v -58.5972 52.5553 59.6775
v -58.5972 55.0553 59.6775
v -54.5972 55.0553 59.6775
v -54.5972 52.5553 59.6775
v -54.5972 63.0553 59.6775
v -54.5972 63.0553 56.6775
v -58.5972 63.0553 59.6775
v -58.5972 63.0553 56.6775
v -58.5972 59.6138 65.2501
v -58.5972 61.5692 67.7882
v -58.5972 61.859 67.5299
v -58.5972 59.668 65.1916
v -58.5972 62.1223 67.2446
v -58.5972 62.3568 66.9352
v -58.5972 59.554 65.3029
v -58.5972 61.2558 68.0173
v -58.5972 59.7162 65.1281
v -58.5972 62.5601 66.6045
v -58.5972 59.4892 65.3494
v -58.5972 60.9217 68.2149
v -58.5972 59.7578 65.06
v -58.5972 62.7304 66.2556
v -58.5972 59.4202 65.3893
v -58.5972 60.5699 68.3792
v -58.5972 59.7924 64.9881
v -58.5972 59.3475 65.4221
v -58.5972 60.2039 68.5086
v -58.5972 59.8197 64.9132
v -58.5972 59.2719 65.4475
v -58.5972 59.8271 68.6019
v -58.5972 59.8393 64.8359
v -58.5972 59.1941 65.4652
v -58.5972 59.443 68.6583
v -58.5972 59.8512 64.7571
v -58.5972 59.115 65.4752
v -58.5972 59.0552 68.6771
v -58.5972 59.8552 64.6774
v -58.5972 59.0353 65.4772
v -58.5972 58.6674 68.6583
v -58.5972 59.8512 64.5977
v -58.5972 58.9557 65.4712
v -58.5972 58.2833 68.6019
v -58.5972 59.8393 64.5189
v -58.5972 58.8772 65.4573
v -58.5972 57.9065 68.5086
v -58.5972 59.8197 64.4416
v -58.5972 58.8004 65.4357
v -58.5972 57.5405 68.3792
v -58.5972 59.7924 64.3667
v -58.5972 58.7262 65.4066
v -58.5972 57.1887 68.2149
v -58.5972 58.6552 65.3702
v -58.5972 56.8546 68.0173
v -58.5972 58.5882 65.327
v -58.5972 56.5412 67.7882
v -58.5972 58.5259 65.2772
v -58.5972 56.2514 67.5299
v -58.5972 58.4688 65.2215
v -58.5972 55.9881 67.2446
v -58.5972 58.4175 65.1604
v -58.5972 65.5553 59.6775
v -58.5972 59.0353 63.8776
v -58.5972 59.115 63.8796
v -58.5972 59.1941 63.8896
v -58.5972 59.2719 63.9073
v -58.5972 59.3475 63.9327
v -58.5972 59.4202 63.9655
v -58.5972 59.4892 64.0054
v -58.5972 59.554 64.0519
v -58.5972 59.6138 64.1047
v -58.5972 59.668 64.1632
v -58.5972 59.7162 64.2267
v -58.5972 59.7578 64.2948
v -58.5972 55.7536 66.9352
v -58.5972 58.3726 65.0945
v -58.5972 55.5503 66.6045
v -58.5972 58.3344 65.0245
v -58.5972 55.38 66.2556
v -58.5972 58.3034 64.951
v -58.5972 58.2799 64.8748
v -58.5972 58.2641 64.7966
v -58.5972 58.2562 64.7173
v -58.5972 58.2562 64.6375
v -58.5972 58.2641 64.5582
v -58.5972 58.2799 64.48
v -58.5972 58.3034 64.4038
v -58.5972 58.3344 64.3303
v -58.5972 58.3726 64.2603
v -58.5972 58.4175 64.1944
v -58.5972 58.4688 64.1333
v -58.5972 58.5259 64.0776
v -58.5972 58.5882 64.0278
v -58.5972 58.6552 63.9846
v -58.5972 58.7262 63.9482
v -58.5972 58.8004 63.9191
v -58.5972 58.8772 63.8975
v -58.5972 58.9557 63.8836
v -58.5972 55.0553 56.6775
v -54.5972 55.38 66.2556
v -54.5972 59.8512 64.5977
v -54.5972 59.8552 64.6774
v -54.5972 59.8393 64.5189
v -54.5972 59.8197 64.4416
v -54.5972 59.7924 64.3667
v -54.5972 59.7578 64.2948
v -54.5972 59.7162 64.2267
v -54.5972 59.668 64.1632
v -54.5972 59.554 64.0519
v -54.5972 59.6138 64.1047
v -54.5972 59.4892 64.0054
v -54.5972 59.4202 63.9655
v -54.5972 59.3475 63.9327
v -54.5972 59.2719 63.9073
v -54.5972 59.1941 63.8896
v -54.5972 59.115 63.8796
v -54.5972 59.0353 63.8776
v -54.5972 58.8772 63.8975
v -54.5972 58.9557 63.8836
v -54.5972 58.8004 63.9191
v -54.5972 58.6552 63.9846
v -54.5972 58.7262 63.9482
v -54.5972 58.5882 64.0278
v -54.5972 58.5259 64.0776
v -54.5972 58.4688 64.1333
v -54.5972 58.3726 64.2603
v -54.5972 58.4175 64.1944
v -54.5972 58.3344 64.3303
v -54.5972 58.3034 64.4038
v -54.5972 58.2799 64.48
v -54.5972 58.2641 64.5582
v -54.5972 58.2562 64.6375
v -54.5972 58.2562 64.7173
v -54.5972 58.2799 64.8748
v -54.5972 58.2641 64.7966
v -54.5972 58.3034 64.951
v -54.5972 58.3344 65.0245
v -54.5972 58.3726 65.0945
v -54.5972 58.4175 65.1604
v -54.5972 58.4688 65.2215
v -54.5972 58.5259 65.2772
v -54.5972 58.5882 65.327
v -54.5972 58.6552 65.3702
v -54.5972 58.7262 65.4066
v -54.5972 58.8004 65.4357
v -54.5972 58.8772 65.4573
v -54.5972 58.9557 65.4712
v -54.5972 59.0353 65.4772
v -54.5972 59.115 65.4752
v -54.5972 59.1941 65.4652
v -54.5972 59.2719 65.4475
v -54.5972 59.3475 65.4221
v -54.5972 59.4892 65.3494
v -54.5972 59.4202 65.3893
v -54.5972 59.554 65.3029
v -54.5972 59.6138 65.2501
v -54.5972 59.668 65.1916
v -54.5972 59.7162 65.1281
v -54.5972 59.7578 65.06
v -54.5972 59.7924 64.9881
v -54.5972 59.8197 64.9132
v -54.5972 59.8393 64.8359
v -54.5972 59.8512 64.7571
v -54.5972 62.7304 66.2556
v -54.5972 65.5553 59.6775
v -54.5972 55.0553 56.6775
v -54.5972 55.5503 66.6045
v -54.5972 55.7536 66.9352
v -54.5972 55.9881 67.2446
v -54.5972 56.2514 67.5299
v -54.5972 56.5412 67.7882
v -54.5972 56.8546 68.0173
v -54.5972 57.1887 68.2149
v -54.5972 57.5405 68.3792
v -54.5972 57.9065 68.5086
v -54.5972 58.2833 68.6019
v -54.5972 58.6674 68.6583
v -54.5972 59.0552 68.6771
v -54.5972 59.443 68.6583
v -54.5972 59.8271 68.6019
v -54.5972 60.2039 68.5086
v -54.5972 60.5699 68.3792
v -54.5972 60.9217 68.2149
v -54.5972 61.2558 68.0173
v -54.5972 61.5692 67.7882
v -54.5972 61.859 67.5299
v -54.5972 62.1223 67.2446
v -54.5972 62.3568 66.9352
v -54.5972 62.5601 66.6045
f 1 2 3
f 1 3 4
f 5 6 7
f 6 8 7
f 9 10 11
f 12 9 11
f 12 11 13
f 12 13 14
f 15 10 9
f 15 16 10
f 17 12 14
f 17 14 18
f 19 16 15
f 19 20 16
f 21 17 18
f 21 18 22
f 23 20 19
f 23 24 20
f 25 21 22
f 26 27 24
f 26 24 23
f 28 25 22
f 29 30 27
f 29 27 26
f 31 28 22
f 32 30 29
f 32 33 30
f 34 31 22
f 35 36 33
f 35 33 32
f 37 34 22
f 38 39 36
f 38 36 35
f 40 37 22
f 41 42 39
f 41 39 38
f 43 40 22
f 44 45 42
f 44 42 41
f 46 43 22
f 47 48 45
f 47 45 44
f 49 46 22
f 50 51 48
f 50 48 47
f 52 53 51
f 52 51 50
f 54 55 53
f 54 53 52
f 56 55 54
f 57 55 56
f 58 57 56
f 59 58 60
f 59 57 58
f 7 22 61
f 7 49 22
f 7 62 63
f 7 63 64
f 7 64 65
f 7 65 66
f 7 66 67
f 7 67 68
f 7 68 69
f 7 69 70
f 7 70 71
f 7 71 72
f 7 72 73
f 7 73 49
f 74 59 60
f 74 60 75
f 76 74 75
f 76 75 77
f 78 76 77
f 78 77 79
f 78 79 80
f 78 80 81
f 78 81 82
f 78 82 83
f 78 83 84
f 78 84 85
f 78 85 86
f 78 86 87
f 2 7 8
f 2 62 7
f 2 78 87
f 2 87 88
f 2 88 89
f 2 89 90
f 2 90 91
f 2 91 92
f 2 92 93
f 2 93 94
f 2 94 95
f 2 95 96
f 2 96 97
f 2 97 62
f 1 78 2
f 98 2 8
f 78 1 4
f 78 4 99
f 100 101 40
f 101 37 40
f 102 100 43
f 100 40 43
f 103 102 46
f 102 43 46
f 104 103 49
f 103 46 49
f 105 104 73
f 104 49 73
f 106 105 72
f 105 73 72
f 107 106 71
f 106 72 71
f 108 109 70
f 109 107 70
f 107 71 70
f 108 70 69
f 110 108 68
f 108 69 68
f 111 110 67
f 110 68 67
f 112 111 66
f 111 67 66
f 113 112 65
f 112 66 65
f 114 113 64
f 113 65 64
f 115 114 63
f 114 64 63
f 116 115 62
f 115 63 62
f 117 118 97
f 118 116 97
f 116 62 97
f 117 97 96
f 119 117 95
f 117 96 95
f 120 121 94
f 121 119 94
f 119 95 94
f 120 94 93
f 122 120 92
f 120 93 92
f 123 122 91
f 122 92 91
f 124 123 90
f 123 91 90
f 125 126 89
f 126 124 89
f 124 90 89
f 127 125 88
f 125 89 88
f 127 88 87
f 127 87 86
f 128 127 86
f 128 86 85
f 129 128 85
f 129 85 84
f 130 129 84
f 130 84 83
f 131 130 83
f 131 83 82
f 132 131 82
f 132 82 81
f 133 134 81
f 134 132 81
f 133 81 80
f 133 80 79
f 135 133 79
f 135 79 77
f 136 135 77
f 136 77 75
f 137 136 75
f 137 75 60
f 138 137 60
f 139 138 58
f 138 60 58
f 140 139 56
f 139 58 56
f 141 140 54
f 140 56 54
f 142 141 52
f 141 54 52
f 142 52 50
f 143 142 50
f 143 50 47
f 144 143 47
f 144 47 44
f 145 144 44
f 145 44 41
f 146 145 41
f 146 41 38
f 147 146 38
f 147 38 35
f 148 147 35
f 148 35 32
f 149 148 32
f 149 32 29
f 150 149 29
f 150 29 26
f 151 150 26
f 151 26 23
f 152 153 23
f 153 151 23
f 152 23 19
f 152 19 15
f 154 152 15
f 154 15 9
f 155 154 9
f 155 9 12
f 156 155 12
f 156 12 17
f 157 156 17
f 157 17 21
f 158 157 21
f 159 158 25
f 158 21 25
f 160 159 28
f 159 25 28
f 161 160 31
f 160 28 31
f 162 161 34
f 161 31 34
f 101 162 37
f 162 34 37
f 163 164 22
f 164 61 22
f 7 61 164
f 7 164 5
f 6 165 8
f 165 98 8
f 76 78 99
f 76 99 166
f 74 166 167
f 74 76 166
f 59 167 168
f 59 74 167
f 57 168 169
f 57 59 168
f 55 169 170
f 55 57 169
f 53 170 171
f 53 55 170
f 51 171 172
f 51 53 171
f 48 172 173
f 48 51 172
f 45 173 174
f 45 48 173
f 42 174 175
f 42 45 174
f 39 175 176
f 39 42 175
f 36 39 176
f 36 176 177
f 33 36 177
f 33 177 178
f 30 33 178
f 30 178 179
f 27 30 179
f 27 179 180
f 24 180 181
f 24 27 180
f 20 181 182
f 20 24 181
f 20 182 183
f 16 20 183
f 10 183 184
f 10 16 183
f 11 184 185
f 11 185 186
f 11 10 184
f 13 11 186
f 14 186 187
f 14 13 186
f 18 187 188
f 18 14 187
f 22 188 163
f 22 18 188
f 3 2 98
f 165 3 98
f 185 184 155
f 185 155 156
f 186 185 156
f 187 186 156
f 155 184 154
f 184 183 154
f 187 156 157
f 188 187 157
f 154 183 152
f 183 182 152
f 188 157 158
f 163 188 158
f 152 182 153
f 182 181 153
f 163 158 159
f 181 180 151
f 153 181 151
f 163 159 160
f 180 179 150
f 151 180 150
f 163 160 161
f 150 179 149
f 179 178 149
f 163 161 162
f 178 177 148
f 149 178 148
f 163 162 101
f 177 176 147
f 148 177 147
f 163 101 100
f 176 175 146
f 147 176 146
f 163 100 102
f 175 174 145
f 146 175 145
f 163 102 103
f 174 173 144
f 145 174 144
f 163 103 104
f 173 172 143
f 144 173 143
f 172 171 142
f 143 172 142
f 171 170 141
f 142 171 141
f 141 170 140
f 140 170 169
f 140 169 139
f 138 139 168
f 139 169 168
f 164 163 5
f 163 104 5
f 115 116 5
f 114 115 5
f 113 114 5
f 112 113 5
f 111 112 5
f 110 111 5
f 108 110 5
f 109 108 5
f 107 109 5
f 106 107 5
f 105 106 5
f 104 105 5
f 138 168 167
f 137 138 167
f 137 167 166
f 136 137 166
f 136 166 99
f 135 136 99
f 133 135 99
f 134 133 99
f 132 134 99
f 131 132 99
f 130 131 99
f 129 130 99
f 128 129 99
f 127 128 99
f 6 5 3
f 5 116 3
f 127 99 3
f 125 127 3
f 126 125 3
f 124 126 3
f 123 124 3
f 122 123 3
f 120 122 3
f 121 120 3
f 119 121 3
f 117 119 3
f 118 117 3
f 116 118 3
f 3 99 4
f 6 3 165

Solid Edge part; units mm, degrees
sketch "Sketch1" plane through (-58.5972, 0, 0) normal (1, 0, 0) x (0, 1, 0)
  line L0 (55.0553, 59.6775) -> (52.5553, 59.6775)
  line L1 (52.5553, 59.6775) -> (55.38, 66.2556)
  line L2 (65.5553, 59.6775) -> (62.7304, 66.2556)
  line L3 (65.5553, 59.6775) -> (63.0553, 59.6775)
  line L4 (63.0553, 56.6775) -> (63.0553, 59.6775)
  line L5 (55.0553, 56.6775) -> (63.0553, 56.6775)
  line L6 (55.0553, 59.6775) -> (55.0553, 56.6775)
  arc A0 (55.38, 66.2556) -> (62.7304, 66.2556) centre (59.0552, 64.6774) cw
  circle A1 centre (59.0552, 64.6774) radius 0.8
extrude "Protrusion1" add sketch "Sketch1" along normal blind 4
